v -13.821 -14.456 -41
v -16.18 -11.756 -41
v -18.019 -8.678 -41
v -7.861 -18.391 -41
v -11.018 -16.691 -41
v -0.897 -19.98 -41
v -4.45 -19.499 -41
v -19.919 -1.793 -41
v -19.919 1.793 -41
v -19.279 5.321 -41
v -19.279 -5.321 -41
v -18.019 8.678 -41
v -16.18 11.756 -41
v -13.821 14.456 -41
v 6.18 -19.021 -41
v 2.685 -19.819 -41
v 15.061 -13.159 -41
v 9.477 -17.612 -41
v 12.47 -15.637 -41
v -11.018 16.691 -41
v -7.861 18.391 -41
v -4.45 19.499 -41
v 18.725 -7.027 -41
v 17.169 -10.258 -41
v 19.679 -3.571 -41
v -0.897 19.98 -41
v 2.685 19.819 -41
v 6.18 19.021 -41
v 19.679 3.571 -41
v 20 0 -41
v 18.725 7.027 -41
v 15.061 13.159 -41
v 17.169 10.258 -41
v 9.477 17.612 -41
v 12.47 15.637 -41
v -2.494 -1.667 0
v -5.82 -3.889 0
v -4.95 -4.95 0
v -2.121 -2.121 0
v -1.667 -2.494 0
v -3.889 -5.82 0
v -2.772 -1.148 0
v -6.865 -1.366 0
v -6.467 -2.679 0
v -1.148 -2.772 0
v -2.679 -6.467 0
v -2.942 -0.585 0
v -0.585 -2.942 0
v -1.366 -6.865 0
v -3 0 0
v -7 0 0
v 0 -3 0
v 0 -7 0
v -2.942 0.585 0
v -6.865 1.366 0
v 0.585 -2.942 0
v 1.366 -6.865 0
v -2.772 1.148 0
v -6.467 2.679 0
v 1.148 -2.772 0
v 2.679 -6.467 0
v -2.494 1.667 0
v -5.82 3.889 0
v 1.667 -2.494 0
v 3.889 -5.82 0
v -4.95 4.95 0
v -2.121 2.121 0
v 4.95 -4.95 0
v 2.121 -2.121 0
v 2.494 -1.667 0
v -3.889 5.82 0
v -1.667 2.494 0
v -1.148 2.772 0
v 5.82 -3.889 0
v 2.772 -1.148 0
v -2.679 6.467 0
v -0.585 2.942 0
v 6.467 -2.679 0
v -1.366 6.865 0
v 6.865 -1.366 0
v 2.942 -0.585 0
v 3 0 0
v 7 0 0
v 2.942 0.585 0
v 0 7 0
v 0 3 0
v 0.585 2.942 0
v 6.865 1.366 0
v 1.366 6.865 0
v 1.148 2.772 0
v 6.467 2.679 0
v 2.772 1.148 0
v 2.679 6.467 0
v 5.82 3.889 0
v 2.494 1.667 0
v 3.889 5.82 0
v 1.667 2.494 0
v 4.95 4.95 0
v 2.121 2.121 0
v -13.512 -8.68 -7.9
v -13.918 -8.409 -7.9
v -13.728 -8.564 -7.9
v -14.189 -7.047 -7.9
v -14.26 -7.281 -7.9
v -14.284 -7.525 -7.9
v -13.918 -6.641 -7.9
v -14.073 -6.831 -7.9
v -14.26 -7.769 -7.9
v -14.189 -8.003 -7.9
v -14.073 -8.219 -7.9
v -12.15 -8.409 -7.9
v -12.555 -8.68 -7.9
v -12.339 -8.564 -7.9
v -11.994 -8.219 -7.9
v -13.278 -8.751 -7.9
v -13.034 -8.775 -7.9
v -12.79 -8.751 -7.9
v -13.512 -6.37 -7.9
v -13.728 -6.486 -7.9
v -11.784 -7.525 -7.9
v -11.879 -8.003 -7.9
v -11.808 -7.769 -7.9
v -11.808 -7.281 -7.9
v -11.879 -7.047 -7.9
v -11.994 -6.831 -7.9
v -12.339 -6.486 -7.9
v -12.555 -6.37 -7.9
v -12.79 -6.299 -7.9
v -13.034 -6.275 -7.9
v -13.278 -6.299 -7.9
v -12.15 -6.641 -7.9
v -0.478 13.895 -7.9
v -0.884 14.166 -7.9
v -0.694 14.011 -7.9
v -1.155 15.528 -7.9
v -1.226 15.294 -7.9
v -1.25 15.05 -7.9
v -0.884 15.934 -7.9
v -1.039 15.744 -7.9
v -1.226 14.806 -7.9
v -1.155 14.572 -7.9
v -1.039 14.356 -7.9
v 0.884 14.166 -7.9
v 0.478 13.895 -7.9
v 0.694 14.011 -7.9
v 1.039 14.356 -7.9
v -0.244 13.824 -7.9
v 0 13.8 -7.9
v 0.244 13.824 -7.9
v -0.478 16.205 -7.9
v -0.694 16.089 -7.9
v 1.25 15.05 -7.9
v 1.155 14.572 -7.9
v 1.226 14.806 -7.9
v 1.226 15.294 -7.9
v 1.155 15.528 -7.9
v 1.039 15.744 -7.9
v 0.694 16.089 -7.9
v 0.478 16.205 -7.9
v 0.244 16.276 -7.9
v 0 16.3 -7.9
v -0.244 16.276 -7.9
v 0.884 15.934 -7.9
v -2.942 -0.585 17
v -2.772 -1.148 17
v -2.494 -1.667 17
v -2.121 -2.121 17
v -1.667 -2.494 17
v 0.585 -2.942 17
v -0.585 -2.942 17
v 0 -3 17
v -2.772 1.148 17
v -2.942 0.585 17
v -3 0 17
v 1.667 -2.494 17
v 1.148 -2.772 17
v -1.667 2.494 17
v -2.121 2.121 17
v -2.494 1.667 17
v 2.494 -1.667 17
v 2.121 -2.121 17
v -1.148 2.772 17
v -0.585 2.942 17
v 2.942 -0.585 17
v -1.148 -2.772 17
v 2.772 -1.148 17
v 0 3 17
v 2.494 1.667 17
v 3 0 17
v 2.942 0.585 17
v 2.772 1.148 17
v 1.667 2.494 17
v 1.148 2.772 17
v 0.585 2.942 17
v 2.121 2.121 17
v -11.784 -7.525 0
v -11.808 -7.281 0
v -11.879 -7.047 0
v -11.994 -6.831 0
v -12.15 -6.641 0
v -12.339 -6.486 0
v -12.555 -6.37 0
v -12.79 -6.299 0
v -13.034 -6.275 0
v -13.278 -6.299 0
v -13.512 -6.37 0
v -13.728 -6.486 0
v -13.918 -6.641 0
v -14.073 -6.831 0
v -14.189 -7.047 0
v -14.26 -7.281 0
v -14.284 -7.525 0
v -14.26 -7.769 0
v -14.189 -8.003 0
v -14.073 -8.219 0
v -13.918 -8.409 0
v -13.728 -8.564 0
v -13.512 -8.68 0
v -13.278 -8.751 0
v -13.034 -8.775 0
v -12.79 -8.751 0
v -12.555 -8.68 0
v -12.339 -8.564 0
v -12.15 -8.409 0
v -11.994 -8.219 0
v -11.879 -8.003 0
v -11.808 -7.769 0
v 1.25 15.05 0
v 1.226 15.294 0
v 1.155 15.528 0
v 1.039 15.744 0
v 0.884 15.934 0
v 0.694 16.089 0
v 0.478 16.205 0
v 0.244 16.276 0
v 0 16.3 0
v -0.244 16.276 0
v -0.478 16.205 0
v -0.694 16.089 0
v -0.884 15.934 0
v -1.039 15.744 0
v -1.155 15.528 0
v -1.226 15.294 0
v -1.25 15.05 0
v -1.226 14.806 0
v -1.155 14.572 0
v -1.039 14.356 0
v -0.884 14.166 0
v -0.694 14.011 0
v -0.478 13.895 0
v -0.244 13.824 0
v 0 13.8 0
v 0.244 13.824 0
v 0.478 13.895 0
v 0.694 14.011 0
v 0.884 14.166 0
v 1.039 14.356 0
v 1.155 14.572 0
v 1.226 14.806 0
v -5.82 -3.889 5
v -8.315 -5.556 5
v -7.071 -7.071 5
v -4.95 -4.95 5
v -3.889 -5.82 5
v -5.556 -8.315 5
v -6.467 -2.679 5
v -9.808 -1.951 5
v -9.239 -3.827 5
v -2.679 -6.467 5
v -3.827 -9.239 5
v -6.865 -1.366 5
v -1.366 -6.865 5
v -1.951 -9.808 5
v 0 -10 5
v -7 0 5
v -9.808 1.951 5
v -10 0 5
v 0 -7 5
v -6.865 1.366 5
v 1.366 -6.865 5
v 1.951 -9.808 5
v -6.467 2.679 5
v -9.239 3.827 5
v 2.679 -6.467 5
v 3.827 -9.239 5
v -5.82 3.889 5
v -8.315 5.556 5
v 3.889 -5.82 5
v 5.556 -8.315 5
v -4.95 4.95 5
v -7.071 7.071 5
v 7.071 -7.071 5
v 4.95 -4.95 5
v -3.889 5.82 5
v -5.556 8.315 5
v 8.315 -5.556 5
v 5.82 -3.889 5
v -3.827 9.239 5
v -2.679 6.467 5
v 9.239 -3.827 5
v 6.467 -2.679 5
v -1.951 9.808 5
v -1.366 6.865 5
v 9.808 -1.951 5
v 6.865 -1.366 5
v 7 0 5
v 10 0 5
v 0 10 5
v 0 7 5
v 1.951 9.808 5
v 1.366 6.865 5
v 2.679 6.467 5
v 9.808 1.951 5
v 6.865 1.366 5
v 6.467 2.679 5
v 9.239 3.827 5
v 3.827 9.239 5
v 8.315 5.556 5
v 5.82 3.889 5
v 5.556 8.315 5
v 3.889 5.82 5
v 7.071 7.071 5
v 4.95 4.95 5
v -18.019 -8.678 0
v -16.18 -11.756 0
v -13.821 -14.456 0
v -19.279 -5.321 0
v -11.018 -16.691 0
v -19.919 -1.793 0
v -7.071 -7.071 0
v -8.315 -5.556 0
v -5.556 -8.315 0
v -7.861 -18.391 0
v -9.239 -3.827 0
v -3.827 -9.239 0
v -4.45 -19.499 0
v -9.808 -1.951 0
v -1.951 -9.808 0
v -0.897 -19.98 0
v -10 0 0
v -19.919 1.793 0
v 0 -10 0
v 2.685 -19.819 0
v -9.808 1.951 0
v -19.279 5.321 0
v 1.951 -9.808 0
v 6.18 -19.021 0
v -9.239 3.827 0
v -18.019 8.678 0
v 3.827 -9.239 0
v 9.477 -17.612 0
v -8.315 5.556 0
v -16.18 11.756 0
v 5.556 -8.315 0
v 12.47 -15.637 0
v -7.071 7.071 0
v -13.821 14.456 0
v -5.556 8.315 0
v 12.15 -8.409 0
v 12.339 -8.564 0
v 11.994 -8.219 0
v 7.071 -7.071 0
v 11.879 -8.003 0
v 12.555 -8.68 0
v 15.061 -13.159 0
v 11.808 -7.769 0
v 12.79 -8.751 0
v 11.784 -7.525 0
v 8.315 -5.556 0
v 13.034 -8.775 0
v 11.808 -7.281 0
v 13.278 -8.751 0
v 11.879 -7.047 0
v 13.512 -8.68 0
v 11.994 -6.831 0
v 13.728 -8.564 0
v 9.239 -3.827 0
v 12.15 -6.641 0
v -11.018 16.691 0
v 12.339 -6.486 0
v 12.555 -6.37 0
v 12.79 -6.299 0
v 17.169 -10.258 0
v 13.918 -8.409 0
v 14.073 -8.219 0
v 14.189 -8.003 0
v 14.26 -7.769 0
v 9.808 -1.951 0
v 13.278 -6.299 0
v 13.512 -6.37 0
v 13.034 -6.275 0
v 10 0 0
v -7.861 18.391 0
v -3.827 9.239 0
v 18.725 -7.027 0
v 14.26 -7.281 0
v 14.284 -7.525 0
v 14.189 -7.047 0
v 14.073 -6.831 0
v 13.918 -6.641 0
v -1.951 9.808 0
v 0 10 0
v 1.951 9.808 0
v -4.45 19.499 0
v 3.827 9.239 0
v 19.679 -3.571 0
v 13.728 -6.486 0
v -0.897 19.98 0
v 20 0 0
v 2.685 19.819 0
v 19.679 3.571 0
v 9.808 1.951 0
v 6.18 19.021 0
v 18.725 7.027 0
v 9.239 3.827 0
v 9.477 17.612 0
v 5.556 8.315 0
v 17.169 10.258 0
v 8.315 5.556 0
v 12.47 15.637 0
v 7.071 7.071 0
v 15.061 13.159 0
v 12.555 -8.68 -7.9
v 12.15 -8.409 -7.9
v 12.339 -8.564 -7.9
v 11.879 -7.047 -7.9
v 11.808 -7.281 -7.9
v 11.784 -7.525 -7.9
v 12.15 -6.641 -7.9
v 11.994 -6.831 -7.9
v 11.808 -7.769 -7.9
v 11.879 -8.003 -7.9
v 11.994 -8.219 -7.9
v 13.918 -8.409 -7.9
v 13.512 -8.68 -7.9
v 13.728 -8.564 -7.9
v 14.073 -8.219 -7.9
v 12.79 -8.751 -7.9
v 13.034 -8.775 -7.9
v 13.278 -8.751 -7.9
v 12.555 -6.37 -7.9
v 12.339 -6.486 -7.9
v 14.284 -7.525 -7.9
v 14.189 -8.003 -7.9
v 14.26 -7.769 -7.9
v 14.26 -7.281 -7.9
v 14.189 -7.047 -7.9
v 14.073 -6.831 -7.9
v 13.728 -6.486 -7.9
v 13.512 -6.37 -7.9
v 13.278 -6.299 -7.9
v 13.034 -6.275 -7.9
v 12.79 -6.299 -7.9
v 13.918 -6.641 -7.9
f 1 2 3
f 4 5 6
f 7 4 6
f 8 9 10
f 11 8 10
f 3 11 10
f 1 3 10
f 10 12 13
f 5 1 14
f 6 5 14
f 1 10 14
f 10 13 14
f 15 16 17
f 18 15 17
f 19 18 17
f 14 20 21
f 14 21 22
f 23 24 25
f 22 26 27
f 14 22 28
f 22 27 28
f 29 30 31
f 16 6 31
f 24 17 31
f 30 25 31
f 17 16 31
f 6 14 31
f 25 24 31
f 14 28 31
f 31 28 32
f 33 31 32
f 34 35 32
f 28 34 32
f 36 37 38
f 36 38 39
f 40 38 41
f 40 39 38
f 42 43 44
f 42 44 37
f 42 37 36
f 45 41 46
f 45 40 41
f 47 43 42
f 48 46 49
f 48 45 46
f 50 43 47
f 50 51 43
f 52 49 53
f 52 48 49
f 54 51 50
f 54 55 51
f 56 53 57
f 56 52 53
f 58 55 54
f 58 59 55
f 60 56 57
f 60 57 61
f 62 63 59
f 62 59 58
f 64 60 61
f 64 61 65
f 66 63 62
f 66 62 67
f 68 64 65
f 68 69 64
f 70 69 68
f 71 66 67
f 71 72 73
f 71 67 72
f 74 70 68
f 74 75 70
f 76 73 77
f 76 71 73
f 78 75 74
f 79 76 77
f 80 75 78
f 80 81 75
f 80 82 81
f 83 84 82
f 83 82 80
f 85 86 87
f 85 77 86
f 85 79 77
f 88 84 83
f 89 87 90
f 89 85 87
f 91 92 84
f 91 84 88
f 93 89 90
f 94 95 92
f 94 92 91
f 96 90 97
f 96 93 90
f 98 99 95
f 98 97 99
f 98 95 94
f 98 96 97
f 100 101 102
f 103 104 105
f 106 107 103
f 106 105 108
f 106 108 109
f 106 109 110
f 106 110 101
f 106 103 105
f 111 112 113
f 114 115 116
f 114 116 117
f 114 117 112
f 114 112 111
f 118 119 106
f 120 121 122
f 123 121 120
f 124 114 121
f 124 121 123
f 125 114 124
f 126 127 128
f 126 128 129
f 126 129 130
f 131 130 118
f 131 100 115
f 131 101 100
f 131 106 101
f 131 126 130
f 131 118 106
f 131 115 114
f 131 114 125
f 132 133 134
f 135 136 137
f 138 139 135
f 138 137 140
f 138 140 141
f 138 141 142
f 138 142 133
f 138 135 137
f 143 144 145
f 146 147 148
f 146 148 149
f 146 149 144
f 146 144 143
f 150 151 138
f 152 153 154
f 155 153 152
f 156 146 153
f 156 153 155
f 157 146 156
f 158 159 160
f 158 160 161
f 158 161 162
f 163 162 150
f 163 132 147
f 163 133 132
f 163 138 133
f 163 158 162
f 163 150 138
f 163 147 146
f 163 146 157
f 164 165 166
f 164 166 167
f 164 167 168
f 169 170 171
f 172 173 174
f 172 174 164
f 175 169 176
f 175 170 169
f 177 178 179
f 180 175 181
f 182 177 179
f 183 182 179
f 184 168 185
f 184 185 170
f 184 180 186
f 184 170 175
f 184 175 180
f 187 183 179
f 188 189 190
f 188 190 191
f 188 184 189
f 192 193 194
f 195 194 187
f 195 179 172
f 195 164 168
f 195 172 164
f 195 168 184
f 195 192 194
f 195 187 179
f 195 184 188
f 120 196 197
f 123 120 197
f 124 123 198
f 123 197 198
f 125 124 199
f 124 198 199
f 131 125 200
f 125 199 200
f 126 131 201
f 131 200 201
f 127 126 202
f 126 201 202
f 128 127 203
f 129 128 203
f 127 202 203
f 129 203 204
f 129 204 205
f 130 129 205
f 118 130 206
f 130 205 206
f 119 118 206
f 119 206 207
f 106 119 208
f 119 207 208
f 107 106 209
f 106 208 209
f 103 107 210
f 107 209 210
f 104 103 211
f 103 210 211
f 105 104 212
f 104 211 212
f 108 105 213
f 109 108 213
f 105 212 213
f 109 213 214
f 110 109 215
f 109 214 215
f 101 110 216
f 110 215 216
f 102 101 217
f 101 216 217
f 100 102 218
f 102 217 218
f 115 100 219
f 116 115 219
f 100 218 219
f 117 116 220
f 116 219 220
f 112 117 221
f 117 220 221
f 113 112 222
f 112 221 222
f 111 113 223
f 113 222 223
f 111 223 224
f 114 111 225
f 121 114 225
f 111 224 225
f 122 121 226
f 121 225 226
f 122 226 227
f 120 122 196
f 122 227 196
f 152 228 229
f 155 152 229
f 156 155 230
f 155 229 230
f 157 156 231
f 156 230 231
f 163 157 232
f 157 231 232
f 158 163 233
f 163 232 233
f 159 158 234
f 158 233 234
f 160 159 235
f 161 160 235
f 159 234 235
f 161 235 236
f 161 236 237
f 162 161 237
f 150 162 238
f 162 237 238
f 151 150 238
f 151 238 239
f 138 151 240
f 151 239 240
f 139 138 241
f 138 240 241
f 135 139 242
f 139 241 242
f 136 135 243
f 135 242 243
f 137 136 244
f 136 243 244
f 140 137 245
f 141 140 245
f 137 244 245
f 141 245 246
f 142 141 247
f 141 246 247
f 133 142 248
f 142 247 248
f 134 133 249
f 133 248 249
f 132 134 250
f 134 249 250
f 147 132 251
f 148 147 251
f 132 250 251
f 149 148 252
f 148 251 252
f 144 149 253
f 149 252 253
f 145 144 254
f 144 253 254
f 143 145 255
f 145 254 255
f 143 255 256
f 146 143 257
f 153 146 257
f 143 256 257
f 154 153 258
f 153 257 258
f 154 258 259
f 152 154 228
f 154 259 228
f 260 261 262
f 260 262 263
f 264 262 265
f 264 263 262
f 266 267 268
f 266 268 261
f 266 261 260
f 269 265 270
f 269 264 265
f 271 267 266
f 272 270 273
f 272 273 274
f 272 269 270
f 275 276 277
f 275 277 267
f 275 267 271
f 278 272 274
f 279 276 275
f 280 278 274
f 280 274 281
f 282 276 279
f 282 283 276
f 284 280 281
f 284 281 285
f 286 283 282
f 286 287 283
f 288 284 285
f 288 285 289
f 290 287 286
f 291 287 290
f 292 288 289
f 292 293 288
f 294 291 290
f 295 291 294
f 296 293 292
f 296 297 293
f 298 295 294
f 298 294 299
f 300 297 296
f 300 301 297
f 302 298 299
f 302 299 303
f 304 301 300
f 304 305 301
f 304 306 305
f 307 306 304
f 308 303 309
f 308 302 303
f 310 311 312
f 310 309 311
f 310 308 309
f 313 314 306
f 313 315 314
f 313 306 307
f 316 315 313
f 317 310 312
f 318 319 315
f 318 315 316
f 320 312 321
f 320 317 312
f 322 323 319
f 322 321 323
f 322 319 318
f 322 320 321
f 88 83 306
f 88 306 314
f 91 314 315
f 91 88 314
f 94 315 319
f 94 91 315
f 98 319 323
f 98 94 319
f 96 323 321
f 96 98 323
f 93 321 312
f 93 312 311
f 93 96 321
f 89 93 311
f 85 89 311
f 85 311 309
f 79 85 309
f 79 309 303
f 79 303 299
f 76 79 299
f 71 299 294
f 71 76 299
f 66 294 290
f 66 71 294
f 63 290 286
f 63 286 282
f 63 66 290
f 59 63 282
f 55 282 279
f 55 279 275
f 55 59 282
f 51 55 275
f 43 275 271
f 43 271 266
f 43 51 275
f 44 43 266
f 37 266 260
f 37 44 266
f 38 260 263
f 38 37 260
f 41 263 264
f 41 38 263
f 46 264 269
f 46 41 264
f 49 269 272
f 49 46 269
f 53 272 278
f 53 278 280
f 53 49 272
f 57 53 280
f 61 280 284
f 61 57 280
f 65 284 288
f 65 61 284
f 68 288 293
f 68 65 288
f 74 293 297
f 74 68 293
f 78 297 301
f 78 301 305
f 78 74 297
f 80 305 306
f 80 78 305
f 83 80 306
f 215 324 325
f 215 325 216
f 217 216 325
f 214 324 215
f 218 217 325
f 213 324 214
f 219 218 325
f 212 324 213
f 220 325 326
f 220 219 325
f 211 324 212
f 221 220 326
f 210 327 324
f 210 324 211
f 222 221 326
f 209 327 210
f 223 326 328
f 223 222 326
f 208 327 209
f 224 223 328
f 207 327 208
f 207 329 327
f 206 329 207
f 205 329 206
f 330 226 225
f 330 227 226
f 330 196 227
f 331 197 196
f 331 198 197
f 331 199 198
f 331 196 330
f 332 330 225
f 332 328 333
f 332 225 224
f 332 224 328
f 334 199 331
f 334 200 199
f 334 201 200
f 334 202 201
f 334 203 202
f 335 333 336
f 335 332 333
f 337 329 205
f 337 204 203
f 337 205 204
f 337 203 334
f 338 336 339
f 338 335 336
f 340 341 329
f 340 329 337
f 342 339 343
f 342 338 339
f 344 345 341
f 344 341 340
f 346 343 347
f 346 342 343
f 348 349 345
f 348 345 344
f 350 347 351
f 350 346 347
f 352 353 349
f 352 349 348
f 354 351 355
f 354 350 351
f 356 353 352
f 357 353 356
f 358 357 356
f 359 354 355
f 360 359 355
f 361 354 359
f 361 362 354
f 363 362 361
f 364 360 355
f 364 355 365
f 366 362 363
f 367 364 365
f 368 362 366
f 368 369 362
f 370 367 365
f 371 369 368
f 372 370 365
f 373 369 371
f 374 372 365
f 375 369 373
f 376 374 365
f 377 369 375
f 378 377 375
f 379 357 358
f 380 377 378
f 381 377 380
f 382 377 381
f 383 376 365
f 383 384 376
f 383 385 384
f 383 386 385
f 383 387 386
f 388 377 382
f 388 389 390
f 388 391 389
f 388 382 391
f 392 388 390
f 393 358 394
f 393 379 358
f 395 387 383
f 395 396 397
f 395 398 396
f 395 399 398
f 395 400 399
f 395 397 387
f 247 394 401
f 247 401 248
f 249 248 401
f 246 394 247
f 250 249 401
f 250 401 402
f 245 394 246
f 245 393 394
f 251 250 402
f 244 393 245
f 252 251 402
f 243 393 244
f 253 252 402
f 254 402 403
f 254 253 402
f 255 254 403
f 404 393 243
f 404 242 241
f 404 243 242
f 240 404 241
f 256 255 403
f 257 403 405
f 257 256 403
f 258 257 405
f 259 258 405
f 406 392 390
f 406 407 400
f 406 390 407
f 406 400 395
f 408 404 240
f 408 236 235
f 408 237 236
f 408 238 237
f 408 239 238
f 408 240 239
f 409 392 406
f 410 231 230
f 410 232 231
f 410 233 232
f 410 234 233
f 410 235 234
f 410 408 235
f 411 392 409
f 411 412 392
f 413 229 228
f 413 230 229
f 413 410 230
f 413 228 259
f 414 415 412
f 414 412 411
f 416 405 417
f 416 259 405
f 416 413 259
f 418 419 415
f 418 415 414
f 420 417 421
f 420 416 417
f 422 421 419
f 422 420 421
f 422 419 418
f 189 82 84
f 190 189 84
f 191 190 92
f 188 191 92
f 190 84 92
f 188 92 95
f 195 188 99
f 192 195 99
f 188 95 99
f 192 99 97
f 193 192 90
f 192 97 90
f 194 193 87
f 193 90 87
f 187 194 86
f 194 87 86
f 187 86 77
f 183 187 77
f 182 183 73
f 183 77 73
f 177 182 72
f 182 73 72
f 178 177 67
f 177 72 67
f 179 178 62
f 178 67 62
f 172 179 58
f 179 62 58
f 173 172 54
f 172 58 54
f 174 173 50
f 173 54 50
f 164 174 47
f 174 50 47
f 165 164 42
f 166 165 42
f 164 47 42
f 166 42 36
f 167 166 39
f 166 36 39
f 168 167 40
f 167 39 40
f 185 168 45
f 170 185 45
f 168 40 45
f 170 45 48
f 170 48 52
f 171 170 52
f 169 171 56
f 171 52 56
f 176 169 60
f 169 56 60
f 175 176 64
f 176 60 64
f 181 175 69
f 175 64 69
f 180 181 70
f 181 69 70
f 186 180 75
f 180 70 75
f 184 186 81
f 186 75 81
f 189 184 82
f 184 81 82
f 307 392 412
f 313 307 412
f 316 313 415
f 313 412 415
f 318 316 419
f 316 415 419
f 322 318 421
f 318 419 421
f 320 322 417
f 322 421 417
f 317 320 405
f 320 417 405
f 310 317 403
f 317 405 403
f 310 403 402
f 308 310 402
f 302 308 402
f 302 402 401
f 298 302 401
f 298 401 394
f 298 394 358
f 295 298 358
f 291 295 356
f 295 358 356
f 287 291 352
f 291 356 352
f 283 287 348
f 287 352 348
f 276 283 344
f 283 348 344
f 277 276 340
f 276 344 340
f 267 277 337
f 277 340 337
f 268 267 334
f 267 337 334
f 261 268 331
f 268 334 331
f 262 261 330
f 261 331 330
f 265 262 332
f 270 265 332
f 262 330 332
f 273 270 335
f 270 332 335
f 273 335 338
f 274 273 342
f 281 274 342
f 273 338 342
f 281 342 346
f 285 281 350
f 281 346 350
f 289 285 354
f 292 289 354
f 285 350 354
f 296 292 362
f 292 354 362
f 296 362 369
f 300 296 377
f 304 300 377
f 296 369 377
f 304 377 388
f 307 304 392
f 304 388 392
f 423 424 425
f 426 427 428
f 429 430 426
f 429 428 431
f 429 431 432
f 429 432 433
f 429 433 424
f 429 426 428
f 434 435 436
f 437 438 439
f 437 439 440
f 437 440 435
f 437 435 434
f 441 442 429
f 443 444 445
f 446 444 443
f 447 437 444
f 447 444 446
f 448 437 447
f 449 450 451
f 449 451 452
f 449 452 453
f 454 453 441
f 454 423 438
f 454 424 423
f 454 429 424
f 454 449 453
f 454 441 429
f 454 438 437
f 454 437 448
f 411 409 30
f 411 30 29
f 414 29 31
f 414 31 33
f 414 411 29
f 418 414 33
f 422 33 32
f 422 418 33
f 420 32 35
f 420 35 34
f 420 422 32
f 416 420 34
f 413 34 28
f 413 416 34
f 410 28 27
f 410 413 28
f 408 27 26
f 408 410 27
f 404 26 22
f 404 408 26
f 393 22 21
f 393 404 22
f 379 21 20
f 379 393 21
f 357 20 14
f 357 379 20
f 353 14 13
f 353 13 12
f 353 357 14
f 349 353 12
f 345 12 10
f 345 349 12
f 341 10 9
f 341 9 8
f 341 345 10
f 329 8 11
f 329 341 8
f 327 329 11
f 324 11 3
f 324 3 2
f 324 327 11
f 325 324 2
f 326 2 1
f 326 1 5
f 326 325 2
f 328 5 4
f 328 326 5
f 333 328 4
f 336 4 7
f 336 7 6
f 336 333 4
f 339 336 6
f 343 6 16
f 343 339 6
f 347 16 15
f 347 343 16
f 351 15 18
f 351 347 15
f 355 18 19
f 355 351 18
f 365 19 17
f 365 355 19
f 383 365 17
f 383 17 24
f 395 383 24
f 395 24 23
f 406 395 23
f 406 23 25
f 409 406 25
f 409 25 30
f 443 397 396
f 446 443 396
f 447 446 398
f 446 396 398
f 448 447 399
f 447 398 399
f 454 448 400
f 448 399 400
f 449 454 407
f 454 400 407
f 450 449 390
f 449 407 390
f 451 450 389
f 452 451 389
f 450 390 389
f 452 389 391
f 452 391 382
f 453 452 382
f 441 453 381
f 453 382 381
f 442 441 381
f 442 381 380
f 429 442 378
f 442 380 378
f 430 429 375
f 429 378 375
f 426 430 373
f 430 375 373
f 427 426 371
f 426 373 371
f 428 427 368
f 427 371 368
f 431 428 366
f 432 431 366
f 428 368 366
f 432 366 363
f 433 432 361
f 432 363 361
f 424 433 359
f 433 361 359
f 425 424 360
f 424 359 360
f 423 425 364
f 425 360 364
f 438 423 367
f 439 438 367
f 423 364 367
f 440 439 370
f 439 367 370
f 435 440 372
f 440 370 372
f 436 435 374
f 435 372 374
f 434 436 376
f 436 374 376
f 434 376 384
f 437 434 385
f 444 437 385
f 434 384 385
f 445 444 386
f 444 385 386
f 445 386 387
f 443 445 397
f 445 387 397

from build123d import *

# Parameters (mm, degrees)
ESQUISSE1_R             = 20
BOSS_EXTRU_1_DEPTH      = 41
ESQUISSE2_R             = 10
ESQUISSE2_R_2           = 7
BOSS_EXTRU_2_DEPTH      = 5
ESQUISSE3_R             = 3
BOSS_EXTRU_3_DEPTH      = 17
ESQUISSE4_R             = 1.25
ENL_V_MAT_EXTRU_1_DEPTH = 7.9


with BuildPart() as part:
    # Esquisse1 → Boss.-Extru.1 (new body)
    with BuildSketch(Plane.XY):
        Circle(ESQUISSE1_R)
    extrude(amount=-BOSS_EXTRU_1_DEPTH)

    # Esquisse2 → Boss.-Extru.2 (add)
    with BuildSketch(Plane.XY):
        Circle(ESQUISSE2_R)
        Circle(ESQUISSE2_R_2, mode=Mode.SUBTRACT)
    extrude(amount=BOSS_EXTRU_2_DEPTH)

    # Esquisse3 → Boss.-Extru.3 (add)
    with BuildSketch(Plane.XY):
        Circle(ESQUISSE3_R)
    extrude(amount=BOSS_EXTRU_3_DEPTH)

    # Esquisse4 → Enlèv. mat.-Extru.1 (cut)
    with BuildSketch(Plane.XY):
        with Locations((0, 15.05)):
            Circle(ESQUISSE4_R)
        with Locations((13.033682327, -7.525)):
            Circle(ESQUISSE4_R)
        with Locations((-13.033682327, -7.525)):
            Circle(ESQUISSE4_R)
    extrude(amount=-ENL_V_MAT_EXTRU_1_DEPTH, mode=Mode.SUBTRACT)


solid = part.part
